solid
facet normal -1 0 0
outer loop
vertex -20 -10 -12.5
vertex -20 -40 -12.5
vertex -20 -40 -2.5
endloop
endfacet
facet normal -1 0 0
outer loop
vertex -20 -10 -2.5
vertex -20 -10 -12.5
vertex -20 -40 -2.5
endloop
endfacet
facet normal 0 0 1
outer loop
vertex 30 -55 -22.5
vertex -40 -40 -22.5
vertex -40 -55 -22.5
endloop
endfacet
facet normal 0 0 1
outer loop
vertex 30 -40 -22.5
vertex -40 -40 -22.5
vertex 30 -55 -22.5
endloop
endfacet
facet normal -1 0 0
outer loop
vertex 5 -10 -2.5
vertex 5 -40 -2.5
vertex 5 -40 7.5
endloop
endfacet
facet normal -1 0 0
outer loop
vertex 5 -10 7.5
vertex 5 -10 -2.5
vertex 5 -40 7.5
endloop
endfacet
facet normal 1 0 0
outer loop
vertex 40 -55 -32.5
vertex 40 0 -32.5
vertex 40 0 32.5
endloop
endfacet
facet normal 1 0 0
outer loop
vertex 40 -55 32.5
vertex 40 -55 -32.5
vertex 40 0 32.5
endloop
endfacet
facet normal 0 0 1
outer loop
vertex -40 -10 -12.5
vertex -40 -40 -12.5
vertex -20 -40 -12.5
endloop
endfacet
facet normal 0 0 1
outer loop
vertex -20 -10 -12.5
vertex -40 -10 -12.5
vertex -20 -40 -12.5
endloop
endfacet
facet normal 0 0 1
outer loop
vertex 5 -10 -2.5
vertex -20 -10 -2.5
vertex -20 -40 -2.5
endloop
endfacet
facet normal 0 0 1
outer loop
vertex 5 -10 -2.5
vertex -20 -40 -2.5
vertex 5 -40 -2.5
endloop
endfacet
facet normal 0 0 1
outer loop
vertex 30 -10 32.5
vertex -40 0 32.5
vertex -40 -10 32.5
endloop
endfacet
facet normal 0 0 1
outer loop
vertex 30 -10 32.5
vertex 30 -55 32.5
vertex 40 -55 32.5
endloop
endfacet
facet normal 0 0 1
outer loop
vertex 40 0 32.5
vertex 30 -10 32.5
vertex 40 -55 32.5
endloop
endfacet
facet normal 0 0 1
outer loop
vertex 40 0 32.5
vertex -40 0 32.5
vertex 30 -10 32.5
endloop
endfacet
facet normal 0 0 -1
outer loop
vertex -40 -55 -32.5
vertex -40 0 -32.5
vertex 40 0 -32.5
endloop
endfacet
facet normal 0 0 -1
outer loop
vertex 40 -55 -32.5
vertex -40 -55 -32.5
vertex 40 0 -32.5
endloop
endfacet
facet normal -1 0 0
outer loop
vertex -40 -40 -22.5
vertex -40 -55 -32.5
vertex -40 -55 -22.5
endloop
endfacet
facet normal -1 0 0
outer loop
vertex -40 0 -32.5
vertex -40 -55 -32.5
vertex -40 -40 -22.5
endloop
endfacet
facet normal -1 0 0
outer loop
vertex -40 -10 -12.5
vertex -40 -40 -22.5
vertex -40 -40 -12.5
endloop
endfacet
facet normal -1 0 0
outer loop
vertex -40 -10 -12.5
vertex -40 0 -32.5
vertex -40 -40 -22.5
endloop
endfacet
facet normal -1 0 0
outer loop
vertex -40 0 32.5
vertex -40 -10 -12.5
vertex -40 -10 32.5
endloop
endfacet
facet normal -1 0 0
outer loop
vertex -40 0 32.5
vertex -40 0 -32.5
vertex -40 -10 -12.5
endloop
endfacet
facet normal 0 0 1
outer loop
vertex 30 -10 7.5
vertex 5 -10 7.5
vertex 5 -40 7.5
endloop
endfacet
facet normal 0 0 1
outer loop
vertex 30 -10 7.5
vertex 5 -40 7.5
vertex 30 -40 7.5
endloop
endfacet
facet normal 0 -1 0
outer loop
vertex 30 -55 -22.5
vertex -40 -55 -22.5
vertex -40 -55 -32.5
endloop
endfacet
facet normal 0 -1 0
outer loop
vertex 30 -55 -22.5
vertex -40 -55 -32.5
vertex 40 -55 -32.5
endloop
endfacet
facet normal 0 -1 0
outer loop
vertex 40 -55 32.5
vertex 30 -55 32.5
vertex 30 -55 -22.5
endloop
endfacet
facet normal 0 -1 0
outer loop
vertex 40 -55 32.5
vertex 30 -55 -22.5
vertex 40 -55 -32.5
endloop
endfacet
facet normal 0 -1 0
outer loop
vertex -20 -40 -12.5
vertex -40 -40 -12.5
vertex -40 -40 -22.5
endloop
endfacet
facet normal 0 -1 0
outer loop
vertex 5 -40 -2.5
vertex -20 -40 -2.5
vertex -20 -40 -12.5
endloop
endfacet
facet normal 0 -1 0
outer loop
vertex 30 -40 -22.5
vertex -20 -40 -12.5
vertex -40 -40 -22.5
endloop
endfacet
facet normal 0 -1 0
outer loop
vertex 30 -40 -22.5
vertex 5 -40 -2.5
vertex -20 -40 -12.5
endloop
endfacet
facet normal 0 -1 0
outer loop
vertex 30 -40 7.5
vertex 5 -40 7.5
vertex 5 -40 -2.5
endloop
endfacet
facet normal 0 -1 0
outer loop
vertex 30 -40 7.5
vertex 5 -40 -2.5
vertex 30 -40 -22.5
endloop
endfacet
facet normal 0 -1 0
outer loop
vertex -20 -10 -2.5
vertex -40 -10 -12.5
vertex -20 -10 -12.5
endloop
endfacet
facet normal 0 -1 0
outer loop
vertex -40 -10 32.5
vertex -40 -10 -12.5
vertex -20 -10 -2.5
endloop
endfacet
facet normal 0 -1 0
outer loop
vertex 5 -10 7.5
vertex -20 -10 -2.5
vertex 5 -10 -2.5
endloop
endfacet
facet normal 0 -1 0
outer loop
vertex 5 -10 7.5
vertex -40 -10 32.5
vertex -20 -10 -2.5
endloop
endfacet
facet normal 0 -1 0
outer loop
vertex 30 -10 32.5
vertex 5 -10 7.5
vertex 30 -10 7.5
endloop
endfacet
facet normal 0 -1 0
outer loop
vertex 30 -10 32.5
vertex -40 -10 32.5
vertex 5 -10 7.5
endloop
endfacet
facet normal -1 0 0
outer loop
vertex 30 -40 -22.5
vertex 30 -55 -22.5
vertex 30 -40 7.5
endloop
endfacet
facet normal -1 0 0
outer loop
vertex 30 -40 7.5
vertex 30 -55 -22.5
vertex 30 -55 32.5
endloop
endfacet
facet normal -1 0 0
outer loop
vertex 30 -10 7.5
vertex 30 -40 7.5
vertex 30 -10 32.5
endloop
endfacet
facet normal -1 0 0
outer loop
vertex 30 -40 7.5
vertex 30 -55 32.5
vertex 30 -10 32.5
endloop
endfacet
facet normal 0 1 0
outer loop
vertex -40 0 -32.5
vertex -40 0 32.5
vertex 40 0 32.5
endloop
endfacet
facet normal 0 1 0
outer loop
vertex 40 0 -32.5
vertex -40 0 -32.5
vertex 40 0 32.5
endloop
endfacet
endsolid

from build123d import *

# Parameters (mm, degrees)
F0_W     = 80
F0_H     = 65
F1_DEPTH = 55
F2_W     = 70
F2_H     = 45
F3_DEPTH = 10
F4_W     = 70
F4_H     = 15
F5_DEPTH = 45
F7_DEPTH = 30


with BuildPart() as f1:
    # F0 (on Front) → F1 (new body)
    with BuildSketch(Plane.XZ):
        Rectangle(F0_W, F0_H)
    extrude(amount=F1_DEPTH)

    # F2 (on face) → F3 (cut)
    with BuildSketch(Plane.XY.offset(32.5)):
        with Locations((-5, -32.5)):
            Rectangle(F2_W, F2_H)
    extrude(amount=-F3_DEPTH, mode=Mode.SUBTRACT)

    # F4 (on face) → F5 (cut)
    with BuildSketch(Plane.XY.offset(22.5)):
        with Locations((-5, -47.5)):
            Rectangle(F4_W, F4_H)
    extrude(amount=-F5_DEPTH, mode=Mode.SUBTRACT)

    # F6 (on face) → F7 (cut)
    with BuildSketch(Plane.XZ.offset(40)):
        Polygon((-40, 22.5), (-40, -12.5), (-20, -12.5), (-20, -2.5), (5, -2.5), (5, 7.5), (30, 7.5), (30, 22.5), align=None)
    extrude(amount=-F7_DEPTH, mode=Mode.SUBTRACT)


solid = f1.part
